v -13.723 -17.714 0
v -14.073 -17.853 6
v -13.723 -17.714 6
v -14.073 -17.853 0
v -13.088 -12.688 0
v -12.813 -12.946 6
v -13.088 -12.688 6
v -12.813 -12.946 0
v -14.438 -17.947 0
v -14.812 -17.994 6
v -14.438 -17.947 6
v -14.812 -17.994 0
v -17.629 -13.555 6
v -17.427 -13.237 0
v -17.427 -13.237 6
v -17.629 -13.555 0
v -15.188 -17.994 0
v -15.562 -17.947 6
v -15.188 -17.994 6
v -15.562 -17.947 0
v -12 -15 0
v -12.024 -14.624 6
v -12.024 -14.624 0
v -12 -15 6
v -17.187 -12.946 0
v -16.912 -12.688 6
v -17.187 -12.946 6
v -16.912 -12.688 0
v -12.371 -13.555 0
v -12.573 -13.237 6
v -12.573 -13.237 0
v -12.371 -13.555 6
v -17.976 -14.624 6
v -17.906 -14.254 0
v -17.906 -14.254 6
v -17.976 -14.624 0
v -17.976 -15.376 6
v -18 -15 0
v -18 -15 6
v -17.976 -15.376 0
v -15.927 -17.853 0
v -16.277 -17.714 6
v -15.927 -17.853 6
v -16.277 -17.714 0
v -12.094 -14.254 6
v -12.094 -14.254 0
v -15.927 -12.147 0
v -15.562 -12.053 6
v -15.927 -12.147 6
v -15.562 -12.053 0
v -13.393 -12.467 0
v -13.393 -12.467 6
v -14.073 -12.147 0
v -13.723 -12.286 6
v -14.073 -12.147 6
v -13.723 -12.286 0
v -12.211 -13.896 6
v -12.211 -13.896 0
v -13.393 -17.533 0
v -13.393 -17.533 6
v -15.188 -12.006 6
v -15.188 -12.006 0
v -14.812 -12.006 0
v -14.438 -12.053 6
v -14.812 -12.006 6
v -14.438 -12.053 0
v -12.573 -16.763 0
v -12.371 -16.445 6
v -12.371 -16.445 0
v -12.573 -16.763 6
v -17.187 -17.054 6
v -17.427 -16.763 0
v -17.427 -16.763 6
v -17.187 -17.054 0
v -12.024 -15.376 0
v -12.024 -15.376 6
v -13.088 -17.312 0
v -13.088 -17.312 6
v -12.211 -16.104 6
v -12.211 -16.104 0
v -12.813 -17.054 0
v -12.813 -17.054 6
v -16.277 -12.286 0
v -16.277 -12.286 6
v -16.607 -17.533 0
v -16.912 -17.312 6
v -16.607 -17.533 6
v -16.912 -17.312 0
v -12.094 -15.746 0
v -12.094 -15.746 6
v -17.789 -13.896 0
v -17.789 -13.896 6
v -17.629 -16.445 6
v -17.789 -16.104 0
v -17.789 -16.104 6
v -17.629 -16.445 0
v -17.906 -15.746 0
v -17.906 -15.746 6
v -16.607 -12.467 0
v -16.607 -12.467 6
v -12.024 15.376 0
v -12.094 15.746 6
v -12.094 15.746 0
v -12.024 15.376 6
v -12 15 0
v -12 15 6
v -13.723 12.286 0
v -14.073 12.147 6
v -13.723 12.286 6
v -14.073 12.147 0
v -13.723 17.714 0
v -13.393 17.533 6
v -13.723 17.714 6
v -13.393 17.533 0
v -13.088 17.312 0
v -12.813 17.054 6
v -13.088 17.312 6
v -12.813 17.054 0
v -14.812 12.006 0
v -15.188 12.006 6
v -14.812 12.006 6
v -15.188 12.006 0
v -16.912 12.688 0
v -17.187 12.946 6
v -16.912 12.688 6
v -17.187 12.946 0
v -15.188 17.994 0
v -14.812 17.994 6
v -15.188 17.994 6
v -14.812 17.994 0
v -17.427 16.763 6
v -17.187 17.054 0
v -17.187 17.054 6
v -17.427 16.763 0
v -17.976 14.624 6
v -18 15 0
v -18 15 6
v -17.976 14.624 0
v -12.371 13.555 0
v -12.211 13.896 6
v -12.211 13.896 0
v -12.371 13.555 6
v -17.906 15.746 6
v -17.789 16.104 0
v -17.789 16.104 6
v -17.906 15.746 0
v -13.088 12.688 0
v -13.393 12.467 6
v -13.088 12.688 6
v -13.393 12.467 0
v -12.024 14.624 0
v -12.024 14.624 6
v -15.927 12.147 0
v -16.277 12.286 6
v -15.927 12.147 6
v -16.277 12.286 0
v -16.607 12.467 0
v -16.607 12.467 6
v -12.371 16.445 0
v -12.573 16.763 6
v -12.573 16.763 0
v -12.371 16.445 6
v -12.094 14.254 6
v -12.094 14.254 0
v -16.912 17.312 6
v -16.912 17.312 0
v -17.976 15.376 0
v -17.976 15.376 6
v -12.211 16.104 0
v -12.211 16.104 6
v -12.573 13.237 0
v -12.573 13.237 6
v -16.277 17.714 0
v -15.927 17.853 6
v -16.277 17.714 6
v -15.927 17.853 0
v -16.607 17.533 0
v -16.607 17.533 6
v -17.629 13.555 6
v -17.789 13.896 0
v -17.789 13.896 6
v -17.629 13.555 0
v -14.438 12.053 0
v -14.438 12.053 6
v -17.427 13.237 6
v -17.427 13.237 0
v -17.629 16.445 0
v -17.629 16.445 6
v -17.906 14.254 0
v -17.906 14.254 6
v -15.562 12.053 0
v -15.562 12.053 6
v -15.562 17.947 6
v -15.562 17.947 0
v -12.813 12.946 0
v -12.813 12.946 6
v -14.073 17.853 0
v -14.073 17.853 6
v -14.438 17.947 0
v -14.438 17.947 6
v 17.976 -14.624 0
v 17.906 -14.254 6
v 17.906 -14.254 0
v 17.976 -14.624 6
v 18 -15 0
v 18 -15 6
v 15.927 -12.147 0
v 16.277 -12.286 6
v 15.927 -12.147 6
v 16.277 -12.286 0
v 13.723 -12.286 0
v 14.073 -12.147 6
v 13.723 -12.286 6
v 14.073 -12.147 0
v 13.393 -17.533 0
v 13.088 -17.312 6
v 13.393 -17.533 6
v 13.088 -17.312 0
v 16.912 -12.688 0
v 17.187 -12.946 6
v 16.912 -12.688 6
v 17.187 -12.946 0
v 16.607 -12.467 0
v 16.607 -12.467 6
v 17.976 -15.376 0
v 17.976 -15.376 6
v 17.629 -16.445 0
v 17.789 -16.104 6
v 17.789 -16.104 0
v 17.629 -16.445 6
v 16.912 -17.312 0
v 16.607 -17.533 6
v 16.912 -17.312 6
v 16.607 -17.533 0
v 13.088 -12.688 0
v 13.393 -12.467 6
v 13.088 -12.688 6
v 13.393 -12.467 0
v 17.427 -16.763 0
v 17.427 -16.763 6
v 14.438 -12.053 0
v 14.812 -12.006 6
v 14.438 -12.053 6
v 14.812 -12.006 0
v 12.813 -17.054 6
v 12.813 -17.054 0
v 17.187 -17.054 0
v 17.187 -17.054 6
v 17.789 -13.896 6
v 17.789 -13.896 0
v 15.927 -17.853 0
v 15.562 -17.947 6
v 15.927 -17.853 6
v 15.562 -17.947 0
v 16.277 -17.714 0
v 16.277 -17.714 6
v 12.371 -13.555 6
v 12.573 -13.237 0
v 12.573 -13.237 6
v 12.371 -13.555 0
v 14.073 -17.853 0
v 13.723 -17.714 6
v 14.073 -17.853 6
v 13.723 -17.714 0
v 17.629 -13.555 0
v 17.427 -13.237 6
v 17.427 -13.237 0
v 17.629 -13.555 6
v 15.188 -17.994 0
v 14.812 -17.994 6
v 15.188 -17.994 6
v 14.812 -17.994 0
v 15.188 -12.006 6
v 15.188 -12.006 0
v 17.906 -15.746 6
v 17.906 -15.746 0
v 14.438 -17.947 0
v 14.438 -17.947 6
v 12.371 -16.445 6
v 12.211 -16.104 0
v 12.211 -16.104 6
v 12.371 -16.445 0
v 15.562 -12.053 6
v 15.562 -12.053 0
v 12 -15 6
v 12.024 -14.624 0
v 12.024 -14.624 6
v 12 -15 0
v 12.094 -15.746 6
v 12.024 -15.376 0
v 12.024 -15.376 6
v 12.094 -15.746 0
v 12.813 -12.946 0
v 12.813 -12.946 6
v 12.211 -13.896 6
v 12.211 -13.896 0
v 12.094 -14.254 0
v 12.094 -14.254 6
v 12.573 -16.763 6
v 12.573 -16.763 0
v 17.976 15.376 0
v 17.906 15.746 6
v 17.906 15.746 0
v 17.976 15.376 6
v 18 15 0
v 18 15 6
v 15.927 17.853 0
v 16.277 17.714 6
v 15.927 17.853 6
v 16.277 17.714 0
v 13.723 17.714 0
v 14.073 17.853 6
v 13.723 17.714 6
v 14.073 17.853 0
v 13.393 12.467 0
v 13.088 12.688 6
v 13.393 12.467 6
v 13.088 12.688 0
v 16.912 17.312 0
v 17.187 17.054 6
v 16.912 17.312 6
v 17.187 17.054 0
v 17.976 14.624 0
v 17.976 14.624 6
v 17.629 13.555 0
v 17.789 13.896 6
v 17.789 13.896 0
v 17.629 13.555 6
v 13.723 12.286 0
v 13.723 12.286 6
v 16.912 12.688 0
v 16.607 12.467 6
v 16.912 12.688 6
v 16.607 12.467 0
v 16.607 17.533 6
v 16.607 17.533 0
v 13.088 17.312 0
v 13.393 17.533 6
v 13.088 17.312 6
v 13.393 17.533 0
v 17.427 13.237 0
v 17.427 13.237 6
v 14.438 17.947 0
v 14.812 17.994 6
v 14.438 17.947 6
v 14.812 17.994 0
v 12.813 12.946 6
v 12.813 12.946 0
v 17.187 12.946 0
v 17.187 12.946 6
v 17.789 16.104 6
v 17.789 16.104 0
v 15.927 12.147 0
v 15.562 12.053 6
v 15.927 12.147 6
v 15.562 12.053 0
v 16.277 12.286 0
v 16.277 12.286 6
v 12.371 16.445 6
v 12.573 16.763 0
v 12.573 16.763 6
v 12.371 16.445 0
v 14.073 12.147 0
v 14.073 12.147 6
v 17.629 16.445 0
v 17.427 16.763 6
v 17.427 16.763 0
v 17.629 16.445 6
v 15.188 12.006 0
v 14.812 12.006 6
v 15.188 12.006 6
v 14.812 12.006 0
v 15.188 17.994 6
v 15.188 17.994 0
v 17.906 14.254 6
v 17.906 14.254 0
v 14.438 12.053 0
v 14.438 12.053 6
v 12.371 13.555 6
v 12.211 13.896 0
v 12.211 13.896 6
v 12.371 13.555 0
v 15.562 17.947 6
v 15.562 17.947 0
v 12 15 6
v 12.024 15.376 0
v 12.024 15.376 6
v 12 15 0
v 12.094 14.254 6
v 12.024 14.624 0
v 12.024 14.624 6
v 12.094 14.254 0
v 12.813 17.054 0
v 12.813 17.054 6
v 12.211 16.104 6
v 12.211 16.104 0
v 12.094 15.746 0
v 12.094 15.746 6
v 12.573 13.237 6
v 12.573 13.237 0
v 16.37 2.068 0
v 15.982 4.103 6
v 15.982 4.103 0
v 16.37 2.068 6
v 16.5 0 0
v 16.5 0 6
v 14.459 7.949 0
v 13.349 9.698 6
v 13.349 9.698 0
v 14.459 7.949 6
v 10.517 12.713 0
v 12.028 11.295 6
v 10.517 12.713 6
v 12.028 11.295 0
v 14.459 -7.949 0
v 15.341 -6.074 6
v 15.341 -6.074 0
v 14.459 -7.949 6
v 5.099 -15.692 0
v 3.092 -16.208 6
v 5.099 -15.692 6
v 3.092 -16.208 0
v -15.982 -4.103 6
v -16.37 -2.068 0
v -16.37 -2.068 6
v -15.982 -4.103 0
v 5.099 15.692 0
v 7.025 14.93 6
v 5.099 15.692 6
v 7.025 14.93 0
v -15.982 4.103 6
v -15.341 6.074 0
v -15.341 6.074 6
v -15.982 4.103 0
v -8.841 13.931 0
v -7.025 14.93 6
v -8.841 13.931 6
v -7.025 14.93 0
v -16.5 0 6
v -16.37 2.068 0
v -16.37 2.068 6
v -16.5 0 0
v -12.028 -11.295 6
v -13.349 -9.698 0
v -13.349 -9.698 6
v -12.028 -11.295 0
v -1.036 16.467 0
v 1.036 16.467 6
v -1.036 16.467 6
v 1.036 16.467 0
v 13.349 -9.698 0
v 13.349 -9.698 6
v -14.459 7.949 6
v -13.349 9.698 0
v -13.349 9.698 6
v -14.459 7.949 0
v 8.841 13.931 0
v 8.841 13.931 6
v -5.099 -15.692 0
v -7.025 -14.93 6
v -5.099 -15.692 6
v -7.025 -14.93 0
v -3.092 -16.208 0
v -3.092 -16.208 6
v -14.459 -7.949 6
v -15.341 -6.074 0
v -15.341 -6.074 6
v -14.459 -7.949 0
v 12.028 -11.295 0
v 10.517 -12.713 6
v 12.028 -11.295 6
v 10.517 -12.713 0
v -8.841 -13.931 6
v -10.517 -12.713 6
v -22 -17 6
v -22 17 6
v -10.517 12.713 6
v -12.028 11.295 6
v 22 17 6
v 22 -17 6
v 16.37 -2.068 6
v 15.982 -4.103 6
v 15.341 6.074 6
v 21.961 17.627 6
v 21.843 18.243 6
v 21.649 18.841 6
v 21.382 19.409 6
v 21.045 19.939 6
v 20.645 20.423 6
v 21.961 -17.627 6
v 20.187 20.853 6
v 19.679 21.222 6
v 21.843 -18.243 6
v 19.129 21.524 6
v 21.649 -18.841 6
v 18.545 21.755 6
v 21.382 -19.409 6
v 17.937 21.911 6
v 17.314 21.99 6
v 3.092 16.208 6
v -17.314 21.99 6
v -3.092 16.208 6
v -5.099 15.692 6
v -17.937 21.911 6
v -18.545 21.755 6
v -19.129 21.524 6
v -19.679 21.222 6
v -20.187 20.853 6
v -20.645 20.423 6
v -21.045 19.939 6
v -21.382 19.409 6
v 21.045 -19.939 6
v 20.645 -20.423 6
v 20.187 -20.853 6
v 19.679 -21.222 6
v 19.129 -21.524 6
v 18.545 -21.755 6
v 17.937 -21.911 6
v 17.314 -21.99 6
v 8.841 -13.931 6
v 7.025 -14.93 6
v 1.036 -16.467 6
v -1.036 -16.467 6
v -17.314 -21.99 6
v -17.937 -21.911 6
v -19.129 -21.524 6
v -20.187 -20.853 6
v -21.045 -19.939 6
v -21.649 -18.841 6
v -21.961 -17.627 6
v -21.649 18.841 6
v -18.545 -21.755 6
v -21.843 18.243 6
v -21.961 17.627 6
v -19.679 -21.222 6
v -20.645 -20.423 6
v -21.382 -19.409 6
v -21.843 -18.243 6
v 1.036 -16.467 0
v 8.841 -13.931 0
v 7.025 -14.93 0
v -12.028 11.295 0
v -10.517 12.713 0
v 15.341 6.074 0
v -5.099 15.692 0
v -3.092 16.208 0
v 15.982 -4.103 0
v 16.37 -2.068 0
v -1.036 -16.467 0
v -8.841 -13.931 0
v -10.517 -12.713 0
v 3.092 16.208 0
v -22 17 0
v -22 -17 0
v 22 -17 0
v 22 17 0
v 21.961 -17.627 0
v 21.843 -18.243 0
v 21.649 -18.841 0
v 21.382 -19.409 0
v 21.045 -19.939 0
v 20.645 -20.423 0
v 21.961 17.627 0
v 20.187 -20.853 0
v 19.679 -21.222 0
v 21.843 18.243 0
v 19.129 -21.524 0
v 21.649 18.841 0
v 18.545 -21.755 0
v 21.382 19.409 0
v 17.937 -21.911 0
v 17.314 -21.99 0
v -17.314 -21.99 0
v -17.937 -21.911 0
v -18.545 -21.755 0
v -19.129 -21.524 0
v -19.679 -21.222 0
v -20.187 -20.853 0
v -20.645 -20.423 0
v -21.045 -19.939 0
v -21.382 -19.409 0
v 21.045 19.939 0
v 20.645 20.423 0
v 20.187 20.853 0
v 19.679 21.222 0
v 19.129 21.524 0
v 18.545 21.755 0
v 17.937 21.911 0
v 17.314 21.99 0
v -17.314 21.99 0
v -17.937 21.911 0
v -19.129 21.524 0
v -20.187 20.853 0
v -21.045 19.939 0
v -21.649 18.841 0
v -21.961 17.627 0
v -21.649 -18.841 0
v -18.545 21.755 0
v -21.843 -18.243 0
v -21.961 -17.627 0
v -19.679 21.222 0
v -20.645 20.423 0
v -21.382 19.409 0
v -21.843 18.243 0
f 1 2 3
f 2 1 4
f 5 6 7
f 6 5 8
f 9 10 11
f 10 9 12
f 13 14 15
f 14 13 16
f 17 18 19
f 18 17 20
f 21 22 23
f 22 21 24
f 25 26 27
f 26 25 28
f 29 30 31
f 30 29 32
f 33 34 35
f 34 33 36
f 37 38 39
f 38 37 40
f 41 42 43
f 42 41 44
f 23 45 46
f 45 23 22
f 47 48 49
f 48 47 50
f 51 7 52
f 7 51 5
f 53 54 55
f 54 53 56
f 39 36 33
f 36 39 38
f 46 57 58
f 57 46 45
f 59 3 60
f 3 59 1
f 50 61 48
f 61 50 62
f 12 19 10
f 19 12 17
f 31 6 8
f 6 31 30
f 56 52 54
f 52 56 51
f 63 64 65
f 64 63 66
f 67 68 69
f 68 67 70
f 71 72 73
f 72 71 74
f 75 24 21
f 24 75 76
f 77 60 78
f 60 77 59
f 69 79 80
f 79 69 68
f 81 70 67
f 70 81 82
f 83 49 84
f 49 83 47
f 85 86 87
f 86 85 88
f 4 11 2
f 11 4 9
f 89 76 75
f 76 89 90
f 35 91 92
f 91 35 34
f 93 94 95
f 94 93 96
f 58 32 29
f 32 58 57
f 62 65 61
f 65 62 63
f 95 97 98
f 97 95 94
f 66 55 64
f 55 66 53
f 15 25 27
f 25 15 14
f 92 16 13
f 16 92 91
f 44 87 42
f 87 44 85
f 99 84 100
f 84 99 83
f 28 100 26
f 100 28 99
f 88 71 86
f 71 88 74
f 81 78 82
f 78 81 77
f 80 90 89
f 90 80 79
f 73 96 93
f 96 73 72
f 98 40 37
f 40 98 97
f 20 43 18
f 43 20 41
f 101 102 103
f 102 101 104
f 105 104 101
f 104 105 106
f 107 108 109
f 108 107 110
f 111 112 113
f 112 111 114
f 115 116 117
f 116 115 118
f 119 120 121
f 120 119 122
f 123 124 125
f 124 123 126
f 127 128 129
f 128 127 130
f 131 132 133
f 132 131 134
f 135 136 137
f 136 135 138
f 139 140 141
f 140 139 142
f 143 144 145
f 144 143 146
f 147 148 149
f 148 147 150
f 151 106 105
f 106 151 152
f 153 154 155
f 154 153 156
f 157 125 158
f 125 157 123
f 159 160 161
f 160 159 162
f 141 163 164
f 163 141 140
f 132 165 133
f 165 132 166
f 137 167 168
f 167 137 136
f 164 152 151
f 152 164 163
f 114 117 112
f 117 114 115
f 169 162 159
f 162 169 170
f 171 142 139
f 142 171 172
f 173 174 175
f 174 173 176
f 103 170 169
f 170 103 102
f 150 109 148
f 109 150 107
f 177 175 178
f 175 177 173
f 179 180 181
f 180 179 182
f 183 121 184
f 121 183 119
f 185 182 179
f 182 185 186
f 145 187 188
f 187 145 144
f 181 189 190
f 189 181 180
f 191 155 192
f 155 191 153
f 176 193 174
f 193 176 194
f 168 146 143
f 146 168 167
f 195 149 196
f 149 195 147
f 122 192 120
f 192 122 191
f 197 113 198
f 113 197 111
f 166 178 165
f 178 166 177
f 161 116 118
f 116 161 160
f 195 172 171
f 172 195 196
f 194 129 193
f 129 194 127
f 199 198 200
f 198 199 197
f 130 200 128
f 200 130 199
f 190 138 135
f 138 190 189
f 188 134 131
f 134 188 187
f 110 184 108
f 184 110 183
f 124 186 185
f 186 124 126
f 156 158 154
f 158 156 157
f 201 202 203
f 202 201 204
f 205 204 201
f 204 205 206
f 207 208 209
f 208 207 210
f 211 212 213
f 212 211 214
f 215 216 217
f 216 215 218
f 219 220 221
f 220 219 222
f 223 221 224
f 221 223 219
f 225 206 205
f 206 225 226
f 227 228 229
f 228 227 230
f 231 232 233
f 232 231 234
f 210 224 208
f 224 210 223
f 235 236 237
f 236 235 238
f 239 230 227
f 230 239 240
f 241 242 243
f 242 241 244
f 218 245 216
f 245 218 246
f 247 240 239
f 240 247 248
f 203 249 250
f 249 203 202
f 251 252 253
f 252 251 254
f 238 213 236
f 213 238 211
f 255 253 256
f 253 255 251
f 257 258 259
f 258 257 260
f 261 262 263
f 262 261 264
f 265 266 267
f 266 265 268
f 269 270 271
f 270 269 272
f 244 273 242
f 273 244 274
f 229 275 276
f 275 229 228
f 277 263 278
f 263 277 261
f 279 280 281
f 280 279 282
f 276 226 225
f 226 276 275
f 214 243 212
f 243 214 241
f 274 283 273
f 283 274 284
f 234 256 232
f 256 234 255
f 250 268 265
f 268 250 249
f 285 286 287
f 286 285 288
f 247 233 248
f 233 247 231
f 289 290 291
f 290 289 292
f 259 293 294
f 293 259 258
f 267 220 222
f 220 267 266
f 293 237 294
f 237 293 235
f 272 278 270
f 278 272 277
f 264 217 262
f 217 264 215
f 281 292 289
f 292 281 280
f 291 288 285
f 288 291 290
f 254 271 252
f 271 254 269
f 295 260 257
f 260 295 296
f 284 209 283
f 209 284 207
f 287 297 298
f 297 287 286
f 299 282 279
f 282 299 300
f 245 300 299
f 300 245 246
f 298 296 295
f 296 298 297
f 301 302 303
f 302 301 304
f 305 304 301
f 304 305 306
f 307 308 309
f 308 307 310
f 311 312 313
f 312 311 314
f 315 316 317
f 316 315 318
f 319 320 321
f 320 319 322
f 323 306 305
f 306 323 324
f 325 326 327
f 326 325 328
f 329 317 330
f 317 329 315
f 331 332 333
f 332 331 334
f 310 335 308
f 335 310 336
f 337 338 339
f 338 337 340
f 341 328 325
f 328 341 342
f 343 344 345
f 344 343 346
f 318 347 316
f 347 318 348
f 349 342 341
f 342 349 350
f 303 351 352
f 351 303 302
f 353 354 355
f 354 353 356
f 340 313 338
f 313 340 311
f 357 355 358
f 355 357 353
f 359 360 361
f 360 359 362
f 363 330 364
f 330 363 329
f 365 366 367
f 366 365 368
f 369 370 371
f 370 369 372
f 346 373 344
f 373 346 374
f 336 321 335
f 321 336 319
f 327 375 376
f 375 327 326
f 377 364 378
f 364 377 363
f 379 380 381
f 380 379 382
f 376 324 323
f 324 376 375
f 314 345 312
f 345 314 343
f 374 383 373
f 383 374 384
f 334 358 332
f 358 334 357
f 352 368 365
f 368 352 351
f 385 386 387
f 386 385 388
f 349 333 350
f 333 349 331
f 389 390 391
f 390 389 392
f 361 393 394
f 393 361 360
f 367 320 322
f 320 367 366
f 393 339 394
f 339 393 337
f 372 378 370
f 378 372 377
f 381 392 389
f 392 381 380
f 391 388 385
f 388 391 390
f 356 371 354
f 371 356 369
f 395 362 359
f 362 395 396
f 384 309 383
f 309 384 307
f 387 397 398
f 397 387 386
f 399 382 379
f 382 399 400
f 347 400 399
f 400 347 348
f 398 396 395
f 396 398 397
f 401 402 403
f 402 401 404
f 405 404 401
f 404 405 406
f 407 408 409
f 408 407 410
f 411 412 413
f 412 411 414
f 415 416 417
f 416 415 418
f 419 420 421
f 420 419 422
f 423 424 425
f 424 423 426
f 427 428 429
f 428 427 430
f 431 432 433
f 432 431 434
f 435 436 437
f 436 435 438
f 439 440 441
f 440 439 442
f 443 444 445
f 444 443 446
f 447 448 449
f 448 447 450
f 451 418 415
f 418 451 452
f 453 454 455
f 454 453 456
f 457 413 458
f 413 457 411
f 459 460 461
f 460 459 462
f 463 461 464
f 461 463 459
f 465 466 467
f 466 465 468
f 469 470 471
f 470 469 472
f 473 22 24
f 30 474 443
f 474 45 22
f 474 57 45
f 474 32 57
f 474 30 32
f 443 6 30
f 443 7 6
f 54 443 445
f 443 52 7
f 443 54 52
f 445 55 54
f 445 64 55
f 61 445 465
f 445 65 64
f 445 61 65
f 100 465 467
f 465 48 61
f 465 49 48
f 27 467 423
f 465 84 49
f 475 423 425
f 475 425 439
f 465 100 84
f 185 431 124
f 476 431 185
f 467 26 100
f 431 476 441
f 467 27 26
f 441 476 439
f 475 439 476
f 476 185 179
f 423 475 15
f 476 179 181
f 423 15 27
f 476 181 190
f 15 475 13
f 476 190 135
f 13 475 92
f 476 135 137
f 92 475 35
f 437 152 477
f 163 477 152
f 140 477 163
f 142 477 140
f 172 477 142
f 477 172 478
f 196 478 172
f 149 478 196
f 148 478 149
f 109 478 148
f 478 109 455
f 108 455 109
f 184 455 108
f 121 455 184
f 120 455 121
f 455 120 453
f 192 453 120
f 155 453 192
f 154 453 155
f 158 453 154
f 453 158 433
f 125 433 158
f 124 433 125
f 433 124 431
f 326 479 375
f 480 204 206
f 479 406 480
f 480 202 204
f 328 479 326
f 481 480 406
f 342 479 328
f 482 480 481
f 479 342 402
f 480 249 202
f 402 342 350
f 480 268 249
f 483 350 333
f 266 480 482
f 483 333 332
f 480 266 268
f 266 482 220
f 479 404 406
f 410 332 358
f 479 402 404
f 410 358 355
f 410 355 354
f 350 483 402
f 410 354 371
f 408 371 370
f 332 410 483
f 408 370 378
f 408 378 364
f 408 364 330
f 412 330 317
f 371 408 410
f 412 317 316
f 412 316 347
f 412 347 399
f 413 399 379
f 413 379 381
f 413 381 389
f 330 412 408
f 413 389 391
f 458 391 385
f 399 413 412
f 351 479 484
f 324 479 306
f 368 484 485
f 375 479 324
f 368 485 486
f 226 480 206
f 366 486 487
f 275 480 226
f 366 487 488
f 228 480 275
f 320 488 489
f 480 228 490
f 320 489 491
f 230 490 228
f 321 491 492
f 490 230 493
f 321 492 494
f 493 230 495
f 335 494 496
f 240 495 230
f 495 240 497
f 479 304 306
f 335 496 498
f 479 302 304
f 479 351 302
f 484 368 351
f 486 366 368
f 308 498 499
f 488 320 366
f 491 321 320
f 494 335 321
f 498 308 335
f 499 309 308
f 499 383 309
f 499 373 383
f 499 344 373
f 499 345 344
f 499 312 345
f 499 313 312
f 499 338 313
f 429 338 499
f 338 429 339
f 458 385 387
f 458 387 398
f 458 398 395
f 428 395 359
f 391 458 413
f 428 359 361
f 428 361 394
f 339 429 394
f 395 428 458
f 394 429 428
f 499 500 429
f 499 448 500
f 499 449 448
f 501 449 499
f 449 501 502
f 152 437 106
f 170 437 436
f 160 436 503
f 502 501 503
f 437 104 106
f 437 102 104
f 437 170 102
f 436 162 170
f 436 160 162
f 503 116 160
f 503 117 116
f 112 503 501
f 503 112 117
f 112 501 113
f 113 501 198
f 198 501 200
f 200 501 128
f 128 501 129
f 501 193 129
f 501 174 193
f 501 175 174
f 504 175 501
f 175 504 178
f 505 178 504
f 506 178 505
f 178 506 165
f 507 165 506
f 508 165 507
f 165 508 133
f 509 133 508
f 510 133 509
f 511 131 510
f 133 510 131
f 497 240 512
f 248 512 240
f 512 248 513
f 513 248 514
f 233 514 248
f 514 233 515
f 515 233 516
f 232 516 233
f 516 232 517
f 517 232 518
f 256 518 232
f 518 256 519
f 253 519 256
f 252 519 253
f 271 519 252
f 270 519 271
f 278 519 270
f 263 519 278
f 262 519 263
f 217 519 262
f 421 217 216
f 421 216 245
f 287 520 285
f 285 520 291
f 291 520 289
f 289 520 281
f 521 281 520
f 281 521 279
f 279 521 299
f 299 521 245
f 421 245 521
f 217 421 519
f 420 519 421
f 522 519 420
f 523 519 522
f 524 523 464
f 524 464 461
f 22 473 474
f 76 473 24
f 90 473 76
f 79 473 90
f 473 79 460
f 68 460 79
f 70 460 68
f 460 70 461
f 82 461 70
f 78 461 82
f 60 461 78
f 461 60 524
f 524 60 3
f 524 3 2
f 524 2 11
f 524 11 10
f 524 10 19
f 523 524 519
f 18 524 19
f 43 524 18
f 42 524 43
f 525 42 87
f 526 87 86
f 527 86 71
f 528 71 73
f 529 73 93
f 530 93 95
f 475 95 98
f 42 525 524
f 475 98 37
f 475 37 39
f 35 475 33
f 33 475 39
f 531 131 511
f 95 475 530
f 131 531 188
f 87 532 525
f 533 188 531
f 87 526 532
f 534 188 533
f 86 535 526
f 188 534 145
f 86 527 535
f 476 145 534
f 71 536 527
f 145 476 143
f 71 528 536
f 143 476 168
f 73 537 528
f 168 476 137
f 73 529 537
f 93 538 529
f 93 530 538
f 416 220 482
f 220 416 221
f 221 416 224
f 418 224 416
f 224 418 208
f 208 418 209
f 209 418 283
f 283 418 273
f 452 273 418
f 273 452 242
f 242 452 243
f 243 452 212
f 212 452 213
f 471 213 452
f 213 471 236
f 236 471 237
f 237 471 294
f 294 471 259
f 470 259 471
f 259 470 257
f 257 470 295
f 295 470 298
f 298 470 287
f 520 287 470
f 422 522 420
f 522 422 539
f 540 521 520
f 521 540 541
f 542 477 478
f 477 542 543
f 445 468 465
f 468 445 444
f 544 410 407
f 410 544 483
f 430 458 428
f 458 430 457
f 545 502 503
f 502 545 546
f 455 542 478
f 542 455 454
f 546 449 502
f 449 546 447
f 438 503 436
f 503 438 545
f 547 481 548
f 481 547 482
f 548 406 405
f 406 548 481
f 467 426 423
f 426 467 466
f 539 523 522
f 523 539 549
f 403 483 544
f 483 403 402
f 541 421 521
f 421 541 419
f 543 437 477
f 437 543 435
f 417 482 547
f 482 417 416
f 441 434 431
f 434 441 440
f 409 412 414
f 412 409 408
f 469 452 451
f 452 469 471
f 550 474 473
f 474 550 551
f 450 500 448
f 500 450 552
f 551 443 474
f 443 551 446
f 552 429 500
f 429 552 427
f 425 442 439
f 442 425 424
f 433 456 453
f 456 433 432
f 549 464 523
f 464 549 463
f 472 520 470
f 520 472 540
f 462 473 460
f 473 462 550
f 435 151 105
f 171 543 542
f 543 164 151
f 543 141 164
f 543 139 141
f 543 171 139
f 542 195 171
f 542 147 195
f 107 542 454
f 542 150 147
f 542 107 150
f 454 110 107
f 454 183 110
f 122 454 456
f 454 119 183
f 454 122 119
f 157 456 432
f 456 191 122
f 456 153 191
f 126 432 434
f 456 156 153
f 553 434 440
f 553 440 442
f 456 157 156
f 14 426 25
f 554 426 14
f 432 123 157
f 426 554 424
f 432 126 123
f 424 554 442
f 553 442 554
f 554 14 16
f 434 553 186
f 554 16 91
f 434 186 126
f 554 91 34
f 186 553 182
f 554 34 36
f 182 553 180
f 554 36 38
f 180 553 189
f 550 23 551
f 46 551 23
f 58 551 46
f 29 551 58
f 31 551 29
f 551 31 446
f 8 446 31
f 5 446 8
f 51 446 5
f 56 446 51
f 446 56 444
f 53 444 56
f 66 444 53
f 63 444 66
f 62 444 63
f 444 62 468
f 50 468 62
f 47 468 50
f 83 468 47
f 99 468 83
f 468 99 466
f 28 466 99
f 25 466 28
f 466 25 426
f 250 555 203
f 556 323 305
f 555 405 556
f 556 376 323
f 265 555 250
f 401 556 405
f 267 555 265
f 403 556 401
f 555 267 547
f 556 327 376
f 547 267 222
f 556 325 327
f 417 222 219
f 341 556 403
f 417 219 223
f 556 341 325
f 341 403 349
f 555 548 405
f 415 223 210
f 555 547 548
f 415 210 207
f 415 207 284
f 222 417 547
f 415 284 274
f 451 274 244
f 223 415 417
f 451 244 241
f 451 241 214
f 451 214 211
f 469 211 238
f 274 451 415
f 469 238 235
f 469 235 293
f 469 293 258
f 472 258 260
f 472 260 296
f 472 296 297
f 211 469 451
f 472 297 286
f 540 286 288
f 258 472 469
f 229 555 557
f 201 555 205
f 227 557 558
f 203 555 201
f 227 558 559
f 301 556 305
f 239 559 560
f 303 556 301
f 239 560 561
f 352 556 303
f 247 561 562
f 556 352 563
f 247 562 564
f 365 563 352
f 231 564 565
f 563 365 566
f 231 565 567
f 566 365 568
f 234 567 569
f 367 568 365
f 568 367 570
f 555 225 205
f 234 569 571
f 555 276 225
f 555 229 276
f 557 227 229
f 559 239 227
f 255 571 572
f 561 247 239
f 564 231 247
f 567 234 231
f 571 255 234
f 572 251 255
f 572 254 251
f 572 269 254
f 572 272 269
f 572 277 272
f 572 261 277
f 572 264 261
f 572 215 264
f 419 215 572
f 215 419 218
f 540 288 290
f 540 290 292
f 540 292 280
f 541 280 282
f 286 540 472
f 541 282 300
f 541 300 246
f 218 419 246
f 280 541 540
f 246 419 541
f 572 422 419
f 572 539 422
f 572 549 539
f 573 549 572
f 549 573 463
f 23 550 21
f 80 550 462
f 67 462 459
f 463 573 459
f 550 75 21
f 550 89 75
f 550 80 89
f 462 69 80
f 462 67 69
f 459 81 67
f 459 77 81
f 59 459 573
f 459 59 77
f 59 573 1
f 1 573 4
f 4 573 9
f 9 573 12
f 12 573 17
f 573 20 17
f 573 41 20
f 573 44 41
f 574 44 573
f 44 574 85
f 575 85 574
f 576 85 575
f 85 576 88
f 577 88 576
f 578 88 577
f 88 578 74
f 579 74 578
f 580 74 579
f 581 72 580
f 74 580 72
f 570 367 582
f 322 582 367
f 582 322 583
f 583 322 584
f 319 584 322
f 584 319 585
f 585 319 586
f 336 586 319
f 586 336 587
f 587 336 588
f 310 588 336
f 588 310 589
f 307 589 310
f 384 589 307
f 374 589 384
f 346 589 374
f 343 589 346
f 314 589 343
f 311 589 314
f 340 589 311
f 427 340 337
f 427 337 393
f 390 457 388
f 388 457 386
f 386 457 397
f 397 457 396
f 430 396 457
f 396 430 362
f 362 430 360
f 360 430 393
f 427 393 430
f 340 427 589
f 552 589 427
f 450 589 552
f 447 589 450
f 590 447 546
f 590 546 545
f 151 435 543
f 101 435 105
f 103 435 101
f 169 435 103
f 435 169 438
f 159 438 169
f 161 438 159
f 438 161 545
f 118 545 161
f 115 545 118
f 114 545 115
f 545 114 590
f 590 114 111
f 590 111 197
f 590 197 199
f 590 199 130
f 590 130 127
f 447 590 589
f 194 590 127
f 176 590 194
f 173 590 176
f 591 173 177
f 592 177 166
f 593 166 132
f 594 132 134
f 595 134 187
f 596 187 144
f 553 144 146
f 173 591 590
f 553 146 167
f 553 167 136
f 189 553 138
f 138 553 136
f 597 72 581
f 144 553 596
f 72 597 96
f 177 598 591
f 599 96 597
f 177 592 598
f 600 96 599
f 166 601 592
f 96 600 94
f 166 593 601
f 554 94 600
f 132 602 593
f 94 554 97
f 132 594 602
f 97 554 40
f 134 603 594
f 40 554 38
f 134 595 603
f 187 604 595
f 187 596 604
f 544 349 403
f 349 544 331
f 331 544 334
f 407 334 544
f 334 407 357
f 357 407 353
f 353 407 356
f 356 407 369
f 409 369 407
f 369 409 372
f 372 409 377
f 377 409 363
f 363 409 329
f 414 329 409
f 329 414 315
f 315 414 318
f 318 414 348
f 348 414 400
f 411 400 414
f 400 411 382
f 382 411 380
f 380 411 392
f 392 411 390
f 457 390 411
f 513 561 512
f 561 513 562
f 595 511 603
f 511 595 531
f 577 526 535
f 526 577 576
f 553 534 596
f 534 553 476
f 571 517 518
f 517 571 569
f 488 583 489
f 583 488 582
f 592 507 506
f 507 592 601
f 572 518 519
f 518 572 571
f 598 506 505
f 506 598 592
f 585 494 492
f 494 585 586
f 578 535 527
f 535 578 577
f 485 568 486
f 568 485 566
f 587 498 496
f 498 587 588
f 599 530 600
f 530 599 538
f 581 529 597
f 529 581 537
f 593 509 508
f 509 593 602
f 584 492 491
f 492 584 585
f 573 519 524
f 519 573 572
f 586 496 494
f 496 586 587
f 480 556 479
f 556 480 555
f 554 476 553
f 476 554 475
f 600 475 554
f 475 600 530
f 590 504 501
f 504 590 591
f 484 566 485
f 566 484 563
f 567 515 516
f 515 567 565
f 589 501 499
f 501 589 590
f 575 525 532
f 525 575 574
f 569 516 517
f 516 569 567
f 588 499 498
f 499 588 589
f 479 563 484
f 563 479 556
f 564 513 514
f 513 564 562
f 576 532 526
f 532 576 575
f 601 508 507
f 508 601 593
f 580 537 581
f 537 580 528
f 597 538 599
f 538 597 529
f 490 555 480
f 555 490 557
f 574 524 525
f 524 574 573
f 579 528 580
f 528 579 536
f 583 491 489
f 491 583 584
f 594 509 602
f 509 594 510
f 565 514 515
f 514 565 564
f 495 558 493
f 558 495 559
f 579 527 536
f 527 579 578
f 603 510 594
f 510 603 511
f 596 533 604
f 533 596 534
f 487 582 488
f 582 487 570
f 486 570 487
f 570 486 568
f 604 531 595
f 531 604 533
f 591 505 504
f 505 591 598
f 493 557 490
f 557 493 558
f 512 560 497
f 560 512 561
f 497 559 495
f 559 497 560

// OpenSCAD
$fn = 50;


difference() {
	union() {
		hull() {
			translate(v = [-17.0000000000, 17.0000000000, 0]) {
				cylinder(h = 6, r = 5);
			}
			translate(v = [17.0000000000, 17.0000000000, 0]) {
				cylinder(h = 6, r = 5);
			}
			translate(v = [-17.0000000000, -17.0000000000, 0]) {
				cylinder(h = 6, r = 5);
			}
			translate(v = [17.0000000000, -17.0000000000, 0]) {
				cylinder(h = 6, r = 5);
			}
		}
	}
	union() {
		#translate(v = [-15.0000000000, -15.0000000000, -100.0000000000]) {
			cylinder(h = 200, r = 3.0000000000);
		}
		#translate(v = [-15.0000000000, 15.0000000000, -100.0000000000]) {
			cylinder(h = 200, r = 3.0000000000);
		}
		#translate(v = [15.0000000000, -15.0000000000, -100.0000000000]) {
			cylinder(h = 200, r = 3.0000000000);
		}
		#translate(v = [15.0000000000, 15.0000000000, -100.0000000000]) {
			cylinder(h = 200, r = 3.0000000000);
		}
		#cylinder(h = 6, r = 16.5000000000);
	}
}
